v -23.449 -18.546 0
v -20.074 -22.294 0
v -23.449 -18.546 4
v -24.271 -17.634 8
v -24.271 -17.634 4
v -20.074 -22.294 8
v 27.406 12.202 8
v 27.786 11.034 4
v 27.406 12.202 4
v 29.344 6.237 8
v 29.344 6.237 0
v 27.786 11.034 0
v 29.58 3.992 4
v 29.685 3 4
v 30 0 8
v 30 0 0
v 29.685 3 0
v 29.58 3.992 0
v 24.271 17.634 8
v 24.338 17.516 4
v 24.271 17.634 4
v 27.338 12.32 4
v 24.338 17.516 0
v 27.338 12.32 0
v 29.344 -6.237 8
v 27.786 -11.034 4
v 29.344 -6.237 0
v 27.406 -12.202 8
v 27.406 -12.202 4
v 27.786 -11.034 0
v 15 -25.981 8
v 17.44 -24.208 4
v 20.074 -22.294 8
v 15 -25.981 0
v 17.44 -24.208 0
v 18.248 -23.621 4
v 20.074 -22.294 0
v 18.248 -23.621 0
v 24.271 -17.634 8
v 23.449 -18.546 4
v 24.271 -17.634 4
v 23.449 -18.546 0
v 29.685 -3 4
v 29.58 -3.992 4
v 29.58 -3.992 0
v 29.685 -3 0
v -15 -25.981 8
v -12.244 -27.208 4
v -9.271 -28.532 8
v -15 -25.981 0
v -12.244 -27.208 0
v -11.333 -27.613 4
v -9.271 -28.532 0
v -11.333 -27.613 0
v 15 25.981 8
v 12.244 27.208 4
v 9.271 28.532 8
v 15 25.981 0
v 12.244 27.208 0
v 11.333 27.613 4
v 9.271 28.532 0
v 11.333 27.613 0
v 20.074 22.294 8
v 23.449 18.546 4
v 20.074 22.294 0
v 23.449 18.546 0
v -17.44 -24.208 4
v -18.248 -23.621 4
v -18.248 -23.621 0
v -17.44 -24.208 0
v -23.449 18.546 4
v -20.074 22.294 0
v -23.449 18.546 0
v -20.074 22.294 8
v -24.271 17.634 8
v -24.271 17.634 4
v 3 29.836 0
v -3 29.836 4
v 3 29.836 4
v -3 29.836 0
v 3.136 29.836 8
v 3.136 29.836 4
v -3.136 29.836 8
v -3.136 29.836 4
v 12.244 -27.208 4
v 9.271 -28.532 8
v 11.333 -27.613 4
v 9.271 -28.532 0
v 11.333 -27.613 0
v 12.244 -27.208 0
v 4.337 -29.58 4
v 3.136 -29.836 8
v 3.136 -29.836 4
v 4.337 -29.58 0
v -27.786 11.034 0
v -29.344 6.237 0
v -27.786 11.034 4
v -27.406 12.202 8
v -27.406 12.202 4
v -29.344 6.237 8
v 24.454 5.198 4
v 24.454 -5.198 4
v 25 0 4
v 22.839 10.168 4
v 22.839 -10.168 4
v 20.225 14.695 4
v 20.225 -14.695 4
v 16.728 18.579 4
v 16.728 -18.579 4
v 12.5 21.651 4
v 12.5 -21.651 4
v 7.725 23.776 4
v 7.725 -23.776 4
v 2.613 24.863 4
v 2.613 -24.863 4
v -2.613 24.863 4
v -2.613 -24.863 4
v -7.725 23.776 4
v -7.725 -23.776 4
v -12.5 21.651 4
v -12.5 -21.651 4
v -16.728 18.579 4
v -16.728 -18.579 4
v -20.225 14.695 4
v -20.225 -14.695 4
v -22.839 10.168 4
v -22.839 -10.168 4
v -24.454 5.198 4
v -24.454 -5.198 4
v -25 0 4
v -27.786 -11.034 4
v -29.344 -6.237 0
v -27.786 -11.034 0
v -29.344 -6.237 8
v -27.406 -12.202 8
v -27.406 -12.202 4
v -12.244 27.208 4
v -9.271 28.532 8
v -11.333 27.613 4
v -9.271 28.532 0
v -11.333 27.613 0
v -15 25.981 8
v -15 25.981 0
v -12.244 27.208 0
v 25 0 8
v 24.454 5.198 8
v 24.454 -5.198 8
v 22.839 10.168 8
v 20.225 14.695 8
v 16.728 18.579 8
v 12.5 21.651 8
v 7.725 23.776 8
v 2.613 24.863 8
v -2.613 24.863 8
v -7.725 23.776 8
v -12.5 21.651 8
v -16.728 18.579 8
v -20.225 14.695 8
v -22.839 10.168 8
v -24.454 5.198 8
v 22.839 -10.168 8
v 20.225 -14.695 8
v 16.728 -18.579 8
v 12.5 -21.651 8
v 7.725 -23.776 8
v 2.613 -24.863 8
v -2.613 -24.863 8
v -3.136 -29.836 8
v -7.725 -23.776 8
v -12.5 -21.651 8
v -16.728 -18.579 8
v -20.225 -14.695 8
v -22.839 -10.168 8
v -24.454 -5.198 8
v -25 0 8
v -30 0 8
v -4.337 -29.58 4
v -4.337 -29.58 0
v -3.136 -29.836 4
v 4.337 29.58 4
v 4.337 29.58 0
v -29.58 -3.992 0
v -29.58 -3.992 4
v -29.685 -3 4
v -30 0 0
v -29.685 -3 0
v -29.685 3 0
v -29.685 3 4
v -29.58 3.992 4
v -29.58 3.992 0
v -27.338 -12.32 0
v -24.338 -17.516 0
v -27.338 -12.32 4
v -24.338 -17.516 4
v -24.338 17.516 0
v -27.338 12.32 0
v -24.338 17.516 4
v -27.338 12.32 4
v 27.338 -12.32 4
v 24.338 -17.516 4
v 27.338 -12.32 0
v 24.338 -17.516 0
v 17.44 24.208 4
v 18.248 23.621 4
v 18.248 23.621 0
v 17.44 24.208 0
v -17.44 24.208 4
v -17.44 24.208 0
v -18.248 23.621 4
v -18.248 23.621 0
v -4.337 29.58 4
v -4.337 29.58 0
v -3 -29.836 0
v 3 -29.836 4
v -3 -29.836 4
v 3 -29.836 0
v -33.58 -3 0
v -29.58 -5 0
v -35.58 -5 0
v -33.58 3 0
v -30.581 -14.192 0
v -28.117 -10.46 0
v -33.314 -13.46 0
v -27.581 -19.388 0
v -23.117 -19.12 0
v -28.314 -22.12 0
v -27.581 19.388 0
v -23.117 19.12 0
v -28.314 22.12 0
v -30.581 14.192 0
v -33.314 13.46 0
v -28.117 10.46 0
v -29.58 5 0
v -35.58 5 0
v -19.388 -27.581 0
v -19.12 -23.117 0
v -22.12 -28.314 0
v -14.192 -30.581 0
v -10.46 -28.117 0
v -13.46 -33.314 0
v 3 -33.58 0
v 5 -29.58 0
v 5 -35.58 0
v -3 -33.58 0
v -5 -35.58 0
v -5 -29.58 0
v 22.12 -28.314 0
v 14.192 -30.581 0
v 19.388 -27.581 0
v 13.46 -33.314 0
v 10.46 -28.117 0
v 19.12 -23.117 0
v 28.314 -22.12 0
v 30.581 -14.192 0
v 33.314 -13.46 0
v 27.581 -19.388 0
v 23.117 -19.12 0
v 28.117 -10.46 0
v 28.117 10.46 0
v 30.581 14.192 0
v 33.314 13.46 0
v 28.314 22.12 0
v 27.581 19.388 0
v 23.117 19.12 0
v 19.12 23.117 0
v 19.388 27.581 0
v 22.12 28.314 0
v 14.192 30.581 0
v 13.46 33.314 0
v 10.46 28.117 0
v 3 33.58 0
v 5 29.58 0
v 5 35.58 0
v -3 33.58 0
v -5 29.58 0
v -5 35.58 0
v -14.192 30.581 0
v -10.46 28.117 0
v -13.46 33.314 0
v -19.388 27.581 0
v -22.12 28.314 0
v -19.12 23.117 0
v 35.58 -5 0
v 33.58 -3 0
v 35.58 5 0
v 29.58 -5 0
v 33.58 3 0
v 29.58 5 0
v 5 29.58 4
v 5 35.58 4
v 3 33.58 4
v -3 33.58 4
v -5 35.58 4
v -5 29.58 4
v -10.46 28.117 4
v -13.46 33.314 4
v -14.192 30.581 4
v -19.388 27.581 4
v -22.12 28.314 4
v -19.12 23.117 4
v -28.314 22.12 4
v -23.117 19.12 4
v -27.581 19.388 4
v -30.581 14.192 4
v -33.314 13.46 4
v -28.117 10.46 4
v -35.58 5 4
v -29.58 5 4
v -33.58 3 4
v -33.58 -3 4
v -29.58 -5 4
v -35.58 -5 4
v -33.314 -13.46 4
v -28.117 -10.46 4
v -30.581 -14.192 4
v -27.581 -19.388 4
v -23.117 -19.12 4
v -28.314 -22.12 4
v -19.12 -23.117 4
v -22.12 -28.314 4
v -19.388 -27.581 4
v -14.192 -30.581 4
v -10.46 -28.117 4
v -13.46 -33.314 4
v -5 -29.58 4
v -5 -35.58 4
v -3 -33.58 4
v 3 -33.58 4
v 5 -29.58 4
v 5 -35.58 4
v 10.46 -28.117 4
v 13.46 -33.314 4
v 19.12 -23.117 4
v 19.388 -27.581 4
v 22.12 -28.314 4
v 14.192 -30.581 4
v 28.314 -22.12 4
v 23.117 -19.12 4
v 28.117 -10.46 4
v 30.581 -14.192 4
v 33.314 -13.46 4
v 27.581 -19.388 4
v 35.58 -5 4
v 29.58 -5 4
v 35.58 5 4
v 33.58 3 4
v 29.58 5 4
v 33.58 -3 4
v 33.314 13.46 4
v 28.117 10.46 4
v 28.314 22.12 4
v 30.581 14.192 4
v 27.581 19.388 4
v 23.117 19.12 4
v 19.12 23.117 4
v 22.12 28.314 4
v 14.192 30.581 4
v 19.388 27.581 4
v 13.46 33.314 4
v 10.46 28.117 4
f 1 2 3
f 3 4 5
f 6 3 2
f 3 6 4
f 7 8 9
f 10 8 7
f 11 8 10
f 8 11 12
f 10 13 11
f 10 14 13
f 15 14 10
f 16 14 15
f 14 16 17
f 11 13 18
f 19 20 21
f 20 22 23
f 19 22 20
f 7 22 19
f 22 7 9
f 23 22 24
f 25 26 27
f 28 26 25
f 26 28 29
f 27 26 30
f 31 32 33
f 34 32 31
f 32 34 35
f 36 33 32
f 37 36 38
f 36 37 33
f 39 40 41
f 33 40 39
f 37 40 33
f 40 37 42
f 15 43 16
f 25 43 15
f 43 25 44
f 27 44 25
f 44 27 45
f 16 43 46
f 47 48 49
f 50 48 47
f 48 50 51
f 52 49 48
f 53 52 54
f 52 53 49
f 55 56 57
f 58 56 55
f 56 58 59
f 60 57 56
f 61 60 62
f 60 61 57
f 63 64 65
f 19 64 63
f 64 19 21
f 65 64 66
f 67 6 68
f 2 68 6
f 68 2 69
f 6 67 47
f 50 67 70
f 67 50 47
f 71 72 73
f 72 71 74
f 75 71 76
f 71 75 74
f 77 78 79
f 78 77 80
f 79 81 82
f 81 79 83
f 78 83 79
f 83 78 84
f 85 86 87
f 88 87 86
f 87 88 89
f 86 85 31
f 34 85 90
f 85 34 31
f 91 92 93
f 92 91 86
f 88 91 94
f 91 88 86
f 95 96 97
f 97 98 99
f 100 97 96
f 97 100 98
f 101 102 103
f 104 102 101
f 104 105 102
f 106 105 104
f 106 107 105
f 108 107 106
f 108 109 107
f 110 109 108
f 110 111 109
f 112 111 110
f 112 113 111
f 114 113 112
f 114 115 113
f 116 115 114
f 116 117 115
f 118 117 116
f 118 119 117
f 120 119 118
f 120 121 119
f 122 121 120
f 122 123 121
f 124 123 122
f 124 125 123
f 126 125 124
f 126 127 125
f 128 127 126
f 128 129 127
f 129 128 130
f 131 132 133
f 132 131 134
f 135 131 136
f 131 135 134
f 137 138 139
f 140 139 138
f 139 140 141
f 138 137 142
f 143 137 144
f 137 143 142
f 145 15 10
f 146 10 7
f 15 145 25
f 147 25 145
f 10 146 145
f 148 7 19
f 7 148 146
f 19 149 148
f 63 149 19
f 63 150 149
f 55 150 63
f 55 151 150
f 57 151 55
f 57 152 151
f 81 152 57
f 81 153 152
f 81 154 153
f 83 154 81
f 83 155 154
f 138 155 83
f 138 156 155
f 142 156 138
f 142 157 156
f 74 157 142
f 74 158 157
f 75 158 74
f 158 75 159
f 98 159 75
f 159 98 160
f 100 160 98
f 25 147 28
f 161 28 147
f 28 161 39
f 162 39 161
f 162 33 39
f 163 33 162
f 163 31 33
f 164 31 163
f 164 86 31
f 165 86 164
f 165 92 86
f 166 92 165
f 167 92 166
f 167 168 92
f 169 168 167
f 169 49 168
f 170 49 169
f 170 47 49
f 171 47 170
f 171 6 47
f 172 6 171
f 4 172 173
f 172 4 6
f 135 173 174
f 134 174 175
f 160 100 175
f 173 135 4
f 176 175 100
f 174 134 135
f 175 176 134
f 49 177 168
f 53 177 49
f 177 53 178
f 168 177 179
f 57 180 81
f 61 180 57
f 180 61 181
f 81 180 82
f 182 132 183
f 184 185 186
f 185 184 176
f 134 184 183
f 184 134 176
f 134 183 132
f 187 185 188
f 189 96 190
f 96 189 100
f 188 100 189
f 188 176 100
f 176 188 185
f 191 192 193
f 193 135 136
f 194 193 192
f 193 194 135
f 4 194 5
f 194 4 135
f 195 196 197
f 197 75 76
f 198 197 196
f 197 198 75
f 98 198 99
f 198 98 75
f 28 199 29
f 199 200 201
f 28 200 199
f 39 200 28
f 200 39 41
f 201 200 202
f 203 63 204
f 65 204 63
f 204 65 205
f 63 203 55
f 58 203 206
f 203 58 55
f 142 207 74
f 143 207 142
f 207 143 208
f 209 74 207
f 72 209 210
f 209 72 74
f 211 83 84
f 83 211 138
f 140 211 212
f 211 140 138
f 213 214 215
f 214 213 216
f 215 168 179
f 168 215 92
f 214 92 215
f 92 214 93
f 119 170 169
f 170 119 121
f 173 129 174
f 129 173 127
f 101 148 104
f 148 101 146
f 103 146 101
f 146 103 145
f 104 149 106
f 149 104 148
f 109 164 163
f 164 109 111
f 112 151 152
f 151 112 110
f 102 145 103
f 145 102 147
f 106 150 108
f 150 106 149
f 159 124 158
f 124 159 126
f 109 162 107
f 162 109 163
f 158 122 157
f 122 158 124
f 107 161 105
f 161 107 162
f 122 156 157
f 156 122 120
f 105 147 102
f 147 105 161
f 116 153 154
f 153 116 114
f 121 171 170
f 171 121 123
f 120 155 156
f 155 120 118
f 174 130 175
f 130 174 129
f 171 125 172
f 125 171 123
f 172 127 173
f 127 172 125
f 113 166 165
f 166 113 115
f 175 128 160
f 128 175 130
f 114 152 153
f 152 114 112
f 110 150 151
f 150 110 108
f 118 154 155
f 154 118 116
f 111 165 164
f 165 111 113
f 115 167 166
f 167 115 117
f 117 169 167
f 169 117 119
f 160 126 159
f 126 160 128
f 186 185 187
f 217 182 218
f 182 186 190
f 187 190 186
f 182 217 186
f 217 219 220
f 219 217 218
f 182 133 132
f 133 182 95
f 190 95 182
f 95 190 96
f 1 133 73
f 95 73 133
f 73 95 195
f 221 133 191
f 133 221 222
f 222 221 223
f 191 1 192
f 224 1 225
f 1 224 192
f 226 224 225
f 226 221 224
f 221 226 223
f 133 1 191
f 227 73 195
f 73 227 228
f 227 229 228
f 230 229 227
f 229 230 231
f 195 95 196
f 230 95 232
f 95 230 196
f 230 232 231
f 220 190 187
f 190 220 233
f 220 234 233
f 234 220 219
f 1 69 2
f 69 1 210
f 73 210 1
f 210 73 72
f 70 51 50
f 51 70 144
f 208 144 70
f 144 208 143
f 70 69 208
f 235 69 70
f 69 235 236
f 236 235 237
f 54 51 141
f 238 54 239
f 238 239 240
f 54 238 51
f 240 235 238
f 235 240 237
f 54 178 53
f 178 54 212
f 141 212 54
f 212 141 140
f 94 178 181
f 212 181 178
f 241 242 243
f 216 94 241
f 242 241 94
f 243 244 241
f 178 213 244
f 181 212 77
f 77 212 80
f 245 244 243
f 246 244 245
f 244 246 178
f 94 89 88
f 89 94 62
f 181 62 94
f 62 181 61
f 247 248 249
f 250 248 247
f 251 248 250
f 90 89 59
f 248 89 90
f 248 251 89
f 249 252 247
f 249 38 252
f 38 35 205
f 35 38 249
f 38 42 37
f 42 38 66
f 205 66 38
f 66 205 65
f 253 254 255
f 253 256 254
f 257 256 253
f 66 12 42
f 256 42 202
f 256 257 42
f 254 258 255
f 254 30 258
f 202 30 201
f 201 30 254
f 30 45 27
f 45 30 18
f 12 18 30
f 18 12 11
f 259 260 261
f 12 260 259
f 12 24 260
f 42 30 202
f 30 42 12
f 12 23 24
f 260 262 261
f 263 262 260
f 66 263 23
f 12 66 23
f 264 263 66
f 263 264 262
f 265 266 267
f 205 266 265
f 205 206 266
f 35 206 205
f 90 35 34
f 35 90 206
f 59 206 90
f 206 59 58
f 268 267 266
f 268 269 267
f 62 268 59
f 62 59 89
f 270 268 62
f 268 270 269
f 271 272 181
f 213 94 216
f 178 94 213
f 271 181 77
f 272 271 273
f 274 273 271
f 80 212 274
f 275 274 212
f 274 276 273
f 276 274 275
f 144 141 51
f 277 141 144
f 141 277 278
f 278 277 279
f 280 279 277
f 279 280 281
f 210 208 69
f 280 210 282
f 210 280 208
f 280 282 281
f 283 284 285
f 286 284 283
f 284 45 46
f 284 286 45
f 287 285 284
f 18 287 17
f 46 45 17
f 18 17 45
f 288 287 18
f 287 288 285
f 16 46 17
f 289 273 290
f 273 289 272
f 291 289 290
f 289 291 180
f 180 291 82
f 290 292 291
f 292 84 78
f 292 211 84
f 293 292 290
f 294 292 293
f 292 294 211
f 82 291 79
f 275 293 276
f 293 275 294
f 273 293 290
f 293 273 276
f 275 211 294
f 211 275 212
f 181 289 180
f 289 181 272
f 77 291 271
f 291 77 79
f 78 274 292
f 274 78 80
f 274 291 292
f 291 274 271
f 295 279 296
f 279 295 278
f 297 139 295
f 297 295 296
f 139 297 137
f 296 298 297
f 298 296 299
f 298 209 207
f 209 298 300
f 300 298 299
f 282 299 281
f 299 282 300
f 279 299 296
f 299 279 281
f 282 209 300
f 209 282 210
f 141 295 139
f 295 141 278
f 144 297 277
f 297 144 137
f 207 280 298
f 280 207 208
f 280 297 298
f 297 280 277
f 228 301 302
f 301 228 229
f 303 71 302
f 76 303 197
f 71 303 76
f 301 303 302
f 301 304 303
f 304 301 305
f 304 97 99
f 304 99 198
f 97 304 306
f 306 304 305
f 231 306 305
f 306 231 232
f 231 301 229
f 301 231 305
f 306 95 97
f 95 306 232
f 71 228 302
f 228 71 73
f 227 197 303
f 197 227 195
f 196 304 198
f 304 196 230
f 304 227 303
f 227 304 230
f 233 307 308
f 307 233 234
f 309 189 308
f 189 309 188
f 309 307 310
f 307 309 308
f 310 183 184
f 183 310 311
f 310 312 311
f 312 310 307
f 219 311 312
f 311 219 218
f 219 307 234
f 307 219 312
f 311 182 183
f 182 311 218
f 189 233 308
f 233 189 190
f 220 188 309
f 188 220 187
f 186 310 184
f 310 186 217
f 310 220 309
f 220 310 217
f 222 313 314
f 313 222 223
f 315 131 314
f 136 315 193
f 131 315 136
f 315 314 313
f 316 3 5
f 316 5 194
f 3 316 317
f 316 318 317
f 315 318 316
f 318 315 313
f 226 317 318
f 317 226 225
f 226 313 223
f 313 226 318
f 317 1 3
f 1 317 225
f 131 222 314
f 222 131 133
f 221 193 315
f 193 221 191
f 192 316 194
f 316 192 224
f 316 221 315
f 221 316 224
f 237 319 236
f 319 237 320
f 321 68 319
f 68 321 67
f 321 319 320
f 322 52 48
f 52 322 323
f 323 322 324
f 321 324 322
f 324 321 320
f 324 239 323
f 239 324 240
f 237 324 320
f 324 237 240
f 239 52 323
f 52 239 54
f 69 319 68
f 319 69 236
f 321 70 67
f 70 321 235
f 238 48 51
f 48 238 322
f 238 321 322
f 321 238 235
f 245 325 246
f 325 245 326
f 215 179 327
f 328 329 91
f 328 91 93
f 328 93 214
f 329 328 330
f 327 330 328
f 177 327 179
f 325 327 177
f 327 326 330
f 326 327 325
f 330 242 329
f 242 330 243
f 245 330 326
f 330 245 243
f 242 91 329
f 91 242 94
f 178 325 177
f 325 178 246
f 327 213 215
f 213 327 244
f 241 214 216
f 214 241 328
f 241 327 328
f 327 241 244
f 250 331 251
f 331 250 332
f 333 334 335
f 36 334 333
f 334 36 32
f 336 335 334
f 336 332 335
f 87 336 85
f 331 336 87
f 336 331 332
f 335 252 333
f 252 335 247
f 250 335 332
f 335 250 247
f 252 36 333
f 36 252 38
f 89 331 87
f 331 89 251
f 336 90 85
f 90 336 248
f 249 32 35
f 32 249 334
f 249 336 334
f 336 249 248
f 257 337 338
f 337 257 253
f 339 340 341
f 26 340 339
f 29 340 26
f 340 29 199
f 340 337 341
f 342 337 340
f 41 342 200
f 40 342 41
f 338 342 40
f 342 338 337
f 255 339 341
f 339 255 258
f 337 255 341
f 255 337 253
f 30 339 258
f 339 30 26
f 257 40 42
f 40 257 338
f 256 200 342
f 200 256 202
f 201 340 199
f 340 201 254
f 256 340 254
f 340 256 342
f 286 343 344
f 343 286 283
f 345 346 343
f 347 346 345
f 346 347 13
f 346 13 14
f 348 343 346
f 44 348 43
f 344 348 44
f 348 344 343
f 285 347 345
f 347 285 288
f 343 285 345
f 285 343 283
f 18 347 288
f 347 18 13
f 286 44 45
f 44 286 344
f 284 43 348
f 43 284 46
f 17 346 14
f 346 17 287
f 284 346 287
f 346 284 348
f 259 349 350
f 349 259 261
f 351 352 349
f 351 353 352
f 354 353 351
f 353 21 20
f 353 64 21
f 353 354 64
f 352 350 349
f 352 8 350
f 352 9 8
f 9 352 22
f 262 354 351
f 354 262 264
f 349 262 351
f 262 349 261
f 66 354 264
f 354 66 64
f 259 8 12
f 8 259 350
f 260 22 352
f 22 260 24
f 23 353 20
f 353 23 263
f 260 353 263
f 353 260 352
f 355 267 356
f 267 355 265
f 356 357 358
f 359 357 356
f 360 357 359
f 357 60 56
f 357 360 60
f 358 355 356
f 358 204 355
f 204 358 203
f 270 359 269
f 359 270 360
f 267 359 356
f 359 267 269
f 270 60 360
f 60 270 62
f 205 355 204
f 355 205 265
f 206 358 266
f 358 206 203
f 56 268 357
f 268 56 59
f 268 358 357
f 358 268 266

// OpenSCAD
// file: rim.scad
module rim(er, ir, h) {
    difference() {
        cylinder(r=er, h=h);
        cylinder(r=ir, h=h);
    }
}

module based_rim(er, ir, h, bh) {
    union() {
        cylinder(r=er, h=bh);
        translate([0,0,bh]) rim(er,ir,h-bh);
    }
}
// file: ear.scad
module ear(length, elength, width, ewidth, height) {
    translate([-length/2,0,0])
    difference() {
        fill_length = length - elength;
        cube([length,width,height]);
        translate([fill_length/2,0,0]) cube([elength,ewidth,height]);
    }
}

module radiused_ear(length, elength, width, ewidth, height, radius) {
    xstate = length / 2;
    ystate = sqrt(radius*radius - xstate*xstate); 
    
    translate([0,ystate,0])
        ear(length, elength, width, ewidth, height);
}
// main file
include<ear.scad>
include<rim.scad>

module ringbase(
    externalRadius,
    internalRadius,
    height,
    baseHeight,
    earLength,
    earEmptyLength,
    earWidth,
    earEmptyWidth,
    earTotal) { 
    step = 360 / earTotal;
    union() {
        based_rim(externalRadius,internalRadius,height,baseHeight);
        for(fi = [0 : step : 359]) 
            rotate([0,0,fi]) radiused_ear(earLength,earEmptyLength,
                earWidth,earEmptyWidth,baseHeight,externalRadius);
    }    
}

ringbase(30,25,8,4,10,6,6,4,12);
